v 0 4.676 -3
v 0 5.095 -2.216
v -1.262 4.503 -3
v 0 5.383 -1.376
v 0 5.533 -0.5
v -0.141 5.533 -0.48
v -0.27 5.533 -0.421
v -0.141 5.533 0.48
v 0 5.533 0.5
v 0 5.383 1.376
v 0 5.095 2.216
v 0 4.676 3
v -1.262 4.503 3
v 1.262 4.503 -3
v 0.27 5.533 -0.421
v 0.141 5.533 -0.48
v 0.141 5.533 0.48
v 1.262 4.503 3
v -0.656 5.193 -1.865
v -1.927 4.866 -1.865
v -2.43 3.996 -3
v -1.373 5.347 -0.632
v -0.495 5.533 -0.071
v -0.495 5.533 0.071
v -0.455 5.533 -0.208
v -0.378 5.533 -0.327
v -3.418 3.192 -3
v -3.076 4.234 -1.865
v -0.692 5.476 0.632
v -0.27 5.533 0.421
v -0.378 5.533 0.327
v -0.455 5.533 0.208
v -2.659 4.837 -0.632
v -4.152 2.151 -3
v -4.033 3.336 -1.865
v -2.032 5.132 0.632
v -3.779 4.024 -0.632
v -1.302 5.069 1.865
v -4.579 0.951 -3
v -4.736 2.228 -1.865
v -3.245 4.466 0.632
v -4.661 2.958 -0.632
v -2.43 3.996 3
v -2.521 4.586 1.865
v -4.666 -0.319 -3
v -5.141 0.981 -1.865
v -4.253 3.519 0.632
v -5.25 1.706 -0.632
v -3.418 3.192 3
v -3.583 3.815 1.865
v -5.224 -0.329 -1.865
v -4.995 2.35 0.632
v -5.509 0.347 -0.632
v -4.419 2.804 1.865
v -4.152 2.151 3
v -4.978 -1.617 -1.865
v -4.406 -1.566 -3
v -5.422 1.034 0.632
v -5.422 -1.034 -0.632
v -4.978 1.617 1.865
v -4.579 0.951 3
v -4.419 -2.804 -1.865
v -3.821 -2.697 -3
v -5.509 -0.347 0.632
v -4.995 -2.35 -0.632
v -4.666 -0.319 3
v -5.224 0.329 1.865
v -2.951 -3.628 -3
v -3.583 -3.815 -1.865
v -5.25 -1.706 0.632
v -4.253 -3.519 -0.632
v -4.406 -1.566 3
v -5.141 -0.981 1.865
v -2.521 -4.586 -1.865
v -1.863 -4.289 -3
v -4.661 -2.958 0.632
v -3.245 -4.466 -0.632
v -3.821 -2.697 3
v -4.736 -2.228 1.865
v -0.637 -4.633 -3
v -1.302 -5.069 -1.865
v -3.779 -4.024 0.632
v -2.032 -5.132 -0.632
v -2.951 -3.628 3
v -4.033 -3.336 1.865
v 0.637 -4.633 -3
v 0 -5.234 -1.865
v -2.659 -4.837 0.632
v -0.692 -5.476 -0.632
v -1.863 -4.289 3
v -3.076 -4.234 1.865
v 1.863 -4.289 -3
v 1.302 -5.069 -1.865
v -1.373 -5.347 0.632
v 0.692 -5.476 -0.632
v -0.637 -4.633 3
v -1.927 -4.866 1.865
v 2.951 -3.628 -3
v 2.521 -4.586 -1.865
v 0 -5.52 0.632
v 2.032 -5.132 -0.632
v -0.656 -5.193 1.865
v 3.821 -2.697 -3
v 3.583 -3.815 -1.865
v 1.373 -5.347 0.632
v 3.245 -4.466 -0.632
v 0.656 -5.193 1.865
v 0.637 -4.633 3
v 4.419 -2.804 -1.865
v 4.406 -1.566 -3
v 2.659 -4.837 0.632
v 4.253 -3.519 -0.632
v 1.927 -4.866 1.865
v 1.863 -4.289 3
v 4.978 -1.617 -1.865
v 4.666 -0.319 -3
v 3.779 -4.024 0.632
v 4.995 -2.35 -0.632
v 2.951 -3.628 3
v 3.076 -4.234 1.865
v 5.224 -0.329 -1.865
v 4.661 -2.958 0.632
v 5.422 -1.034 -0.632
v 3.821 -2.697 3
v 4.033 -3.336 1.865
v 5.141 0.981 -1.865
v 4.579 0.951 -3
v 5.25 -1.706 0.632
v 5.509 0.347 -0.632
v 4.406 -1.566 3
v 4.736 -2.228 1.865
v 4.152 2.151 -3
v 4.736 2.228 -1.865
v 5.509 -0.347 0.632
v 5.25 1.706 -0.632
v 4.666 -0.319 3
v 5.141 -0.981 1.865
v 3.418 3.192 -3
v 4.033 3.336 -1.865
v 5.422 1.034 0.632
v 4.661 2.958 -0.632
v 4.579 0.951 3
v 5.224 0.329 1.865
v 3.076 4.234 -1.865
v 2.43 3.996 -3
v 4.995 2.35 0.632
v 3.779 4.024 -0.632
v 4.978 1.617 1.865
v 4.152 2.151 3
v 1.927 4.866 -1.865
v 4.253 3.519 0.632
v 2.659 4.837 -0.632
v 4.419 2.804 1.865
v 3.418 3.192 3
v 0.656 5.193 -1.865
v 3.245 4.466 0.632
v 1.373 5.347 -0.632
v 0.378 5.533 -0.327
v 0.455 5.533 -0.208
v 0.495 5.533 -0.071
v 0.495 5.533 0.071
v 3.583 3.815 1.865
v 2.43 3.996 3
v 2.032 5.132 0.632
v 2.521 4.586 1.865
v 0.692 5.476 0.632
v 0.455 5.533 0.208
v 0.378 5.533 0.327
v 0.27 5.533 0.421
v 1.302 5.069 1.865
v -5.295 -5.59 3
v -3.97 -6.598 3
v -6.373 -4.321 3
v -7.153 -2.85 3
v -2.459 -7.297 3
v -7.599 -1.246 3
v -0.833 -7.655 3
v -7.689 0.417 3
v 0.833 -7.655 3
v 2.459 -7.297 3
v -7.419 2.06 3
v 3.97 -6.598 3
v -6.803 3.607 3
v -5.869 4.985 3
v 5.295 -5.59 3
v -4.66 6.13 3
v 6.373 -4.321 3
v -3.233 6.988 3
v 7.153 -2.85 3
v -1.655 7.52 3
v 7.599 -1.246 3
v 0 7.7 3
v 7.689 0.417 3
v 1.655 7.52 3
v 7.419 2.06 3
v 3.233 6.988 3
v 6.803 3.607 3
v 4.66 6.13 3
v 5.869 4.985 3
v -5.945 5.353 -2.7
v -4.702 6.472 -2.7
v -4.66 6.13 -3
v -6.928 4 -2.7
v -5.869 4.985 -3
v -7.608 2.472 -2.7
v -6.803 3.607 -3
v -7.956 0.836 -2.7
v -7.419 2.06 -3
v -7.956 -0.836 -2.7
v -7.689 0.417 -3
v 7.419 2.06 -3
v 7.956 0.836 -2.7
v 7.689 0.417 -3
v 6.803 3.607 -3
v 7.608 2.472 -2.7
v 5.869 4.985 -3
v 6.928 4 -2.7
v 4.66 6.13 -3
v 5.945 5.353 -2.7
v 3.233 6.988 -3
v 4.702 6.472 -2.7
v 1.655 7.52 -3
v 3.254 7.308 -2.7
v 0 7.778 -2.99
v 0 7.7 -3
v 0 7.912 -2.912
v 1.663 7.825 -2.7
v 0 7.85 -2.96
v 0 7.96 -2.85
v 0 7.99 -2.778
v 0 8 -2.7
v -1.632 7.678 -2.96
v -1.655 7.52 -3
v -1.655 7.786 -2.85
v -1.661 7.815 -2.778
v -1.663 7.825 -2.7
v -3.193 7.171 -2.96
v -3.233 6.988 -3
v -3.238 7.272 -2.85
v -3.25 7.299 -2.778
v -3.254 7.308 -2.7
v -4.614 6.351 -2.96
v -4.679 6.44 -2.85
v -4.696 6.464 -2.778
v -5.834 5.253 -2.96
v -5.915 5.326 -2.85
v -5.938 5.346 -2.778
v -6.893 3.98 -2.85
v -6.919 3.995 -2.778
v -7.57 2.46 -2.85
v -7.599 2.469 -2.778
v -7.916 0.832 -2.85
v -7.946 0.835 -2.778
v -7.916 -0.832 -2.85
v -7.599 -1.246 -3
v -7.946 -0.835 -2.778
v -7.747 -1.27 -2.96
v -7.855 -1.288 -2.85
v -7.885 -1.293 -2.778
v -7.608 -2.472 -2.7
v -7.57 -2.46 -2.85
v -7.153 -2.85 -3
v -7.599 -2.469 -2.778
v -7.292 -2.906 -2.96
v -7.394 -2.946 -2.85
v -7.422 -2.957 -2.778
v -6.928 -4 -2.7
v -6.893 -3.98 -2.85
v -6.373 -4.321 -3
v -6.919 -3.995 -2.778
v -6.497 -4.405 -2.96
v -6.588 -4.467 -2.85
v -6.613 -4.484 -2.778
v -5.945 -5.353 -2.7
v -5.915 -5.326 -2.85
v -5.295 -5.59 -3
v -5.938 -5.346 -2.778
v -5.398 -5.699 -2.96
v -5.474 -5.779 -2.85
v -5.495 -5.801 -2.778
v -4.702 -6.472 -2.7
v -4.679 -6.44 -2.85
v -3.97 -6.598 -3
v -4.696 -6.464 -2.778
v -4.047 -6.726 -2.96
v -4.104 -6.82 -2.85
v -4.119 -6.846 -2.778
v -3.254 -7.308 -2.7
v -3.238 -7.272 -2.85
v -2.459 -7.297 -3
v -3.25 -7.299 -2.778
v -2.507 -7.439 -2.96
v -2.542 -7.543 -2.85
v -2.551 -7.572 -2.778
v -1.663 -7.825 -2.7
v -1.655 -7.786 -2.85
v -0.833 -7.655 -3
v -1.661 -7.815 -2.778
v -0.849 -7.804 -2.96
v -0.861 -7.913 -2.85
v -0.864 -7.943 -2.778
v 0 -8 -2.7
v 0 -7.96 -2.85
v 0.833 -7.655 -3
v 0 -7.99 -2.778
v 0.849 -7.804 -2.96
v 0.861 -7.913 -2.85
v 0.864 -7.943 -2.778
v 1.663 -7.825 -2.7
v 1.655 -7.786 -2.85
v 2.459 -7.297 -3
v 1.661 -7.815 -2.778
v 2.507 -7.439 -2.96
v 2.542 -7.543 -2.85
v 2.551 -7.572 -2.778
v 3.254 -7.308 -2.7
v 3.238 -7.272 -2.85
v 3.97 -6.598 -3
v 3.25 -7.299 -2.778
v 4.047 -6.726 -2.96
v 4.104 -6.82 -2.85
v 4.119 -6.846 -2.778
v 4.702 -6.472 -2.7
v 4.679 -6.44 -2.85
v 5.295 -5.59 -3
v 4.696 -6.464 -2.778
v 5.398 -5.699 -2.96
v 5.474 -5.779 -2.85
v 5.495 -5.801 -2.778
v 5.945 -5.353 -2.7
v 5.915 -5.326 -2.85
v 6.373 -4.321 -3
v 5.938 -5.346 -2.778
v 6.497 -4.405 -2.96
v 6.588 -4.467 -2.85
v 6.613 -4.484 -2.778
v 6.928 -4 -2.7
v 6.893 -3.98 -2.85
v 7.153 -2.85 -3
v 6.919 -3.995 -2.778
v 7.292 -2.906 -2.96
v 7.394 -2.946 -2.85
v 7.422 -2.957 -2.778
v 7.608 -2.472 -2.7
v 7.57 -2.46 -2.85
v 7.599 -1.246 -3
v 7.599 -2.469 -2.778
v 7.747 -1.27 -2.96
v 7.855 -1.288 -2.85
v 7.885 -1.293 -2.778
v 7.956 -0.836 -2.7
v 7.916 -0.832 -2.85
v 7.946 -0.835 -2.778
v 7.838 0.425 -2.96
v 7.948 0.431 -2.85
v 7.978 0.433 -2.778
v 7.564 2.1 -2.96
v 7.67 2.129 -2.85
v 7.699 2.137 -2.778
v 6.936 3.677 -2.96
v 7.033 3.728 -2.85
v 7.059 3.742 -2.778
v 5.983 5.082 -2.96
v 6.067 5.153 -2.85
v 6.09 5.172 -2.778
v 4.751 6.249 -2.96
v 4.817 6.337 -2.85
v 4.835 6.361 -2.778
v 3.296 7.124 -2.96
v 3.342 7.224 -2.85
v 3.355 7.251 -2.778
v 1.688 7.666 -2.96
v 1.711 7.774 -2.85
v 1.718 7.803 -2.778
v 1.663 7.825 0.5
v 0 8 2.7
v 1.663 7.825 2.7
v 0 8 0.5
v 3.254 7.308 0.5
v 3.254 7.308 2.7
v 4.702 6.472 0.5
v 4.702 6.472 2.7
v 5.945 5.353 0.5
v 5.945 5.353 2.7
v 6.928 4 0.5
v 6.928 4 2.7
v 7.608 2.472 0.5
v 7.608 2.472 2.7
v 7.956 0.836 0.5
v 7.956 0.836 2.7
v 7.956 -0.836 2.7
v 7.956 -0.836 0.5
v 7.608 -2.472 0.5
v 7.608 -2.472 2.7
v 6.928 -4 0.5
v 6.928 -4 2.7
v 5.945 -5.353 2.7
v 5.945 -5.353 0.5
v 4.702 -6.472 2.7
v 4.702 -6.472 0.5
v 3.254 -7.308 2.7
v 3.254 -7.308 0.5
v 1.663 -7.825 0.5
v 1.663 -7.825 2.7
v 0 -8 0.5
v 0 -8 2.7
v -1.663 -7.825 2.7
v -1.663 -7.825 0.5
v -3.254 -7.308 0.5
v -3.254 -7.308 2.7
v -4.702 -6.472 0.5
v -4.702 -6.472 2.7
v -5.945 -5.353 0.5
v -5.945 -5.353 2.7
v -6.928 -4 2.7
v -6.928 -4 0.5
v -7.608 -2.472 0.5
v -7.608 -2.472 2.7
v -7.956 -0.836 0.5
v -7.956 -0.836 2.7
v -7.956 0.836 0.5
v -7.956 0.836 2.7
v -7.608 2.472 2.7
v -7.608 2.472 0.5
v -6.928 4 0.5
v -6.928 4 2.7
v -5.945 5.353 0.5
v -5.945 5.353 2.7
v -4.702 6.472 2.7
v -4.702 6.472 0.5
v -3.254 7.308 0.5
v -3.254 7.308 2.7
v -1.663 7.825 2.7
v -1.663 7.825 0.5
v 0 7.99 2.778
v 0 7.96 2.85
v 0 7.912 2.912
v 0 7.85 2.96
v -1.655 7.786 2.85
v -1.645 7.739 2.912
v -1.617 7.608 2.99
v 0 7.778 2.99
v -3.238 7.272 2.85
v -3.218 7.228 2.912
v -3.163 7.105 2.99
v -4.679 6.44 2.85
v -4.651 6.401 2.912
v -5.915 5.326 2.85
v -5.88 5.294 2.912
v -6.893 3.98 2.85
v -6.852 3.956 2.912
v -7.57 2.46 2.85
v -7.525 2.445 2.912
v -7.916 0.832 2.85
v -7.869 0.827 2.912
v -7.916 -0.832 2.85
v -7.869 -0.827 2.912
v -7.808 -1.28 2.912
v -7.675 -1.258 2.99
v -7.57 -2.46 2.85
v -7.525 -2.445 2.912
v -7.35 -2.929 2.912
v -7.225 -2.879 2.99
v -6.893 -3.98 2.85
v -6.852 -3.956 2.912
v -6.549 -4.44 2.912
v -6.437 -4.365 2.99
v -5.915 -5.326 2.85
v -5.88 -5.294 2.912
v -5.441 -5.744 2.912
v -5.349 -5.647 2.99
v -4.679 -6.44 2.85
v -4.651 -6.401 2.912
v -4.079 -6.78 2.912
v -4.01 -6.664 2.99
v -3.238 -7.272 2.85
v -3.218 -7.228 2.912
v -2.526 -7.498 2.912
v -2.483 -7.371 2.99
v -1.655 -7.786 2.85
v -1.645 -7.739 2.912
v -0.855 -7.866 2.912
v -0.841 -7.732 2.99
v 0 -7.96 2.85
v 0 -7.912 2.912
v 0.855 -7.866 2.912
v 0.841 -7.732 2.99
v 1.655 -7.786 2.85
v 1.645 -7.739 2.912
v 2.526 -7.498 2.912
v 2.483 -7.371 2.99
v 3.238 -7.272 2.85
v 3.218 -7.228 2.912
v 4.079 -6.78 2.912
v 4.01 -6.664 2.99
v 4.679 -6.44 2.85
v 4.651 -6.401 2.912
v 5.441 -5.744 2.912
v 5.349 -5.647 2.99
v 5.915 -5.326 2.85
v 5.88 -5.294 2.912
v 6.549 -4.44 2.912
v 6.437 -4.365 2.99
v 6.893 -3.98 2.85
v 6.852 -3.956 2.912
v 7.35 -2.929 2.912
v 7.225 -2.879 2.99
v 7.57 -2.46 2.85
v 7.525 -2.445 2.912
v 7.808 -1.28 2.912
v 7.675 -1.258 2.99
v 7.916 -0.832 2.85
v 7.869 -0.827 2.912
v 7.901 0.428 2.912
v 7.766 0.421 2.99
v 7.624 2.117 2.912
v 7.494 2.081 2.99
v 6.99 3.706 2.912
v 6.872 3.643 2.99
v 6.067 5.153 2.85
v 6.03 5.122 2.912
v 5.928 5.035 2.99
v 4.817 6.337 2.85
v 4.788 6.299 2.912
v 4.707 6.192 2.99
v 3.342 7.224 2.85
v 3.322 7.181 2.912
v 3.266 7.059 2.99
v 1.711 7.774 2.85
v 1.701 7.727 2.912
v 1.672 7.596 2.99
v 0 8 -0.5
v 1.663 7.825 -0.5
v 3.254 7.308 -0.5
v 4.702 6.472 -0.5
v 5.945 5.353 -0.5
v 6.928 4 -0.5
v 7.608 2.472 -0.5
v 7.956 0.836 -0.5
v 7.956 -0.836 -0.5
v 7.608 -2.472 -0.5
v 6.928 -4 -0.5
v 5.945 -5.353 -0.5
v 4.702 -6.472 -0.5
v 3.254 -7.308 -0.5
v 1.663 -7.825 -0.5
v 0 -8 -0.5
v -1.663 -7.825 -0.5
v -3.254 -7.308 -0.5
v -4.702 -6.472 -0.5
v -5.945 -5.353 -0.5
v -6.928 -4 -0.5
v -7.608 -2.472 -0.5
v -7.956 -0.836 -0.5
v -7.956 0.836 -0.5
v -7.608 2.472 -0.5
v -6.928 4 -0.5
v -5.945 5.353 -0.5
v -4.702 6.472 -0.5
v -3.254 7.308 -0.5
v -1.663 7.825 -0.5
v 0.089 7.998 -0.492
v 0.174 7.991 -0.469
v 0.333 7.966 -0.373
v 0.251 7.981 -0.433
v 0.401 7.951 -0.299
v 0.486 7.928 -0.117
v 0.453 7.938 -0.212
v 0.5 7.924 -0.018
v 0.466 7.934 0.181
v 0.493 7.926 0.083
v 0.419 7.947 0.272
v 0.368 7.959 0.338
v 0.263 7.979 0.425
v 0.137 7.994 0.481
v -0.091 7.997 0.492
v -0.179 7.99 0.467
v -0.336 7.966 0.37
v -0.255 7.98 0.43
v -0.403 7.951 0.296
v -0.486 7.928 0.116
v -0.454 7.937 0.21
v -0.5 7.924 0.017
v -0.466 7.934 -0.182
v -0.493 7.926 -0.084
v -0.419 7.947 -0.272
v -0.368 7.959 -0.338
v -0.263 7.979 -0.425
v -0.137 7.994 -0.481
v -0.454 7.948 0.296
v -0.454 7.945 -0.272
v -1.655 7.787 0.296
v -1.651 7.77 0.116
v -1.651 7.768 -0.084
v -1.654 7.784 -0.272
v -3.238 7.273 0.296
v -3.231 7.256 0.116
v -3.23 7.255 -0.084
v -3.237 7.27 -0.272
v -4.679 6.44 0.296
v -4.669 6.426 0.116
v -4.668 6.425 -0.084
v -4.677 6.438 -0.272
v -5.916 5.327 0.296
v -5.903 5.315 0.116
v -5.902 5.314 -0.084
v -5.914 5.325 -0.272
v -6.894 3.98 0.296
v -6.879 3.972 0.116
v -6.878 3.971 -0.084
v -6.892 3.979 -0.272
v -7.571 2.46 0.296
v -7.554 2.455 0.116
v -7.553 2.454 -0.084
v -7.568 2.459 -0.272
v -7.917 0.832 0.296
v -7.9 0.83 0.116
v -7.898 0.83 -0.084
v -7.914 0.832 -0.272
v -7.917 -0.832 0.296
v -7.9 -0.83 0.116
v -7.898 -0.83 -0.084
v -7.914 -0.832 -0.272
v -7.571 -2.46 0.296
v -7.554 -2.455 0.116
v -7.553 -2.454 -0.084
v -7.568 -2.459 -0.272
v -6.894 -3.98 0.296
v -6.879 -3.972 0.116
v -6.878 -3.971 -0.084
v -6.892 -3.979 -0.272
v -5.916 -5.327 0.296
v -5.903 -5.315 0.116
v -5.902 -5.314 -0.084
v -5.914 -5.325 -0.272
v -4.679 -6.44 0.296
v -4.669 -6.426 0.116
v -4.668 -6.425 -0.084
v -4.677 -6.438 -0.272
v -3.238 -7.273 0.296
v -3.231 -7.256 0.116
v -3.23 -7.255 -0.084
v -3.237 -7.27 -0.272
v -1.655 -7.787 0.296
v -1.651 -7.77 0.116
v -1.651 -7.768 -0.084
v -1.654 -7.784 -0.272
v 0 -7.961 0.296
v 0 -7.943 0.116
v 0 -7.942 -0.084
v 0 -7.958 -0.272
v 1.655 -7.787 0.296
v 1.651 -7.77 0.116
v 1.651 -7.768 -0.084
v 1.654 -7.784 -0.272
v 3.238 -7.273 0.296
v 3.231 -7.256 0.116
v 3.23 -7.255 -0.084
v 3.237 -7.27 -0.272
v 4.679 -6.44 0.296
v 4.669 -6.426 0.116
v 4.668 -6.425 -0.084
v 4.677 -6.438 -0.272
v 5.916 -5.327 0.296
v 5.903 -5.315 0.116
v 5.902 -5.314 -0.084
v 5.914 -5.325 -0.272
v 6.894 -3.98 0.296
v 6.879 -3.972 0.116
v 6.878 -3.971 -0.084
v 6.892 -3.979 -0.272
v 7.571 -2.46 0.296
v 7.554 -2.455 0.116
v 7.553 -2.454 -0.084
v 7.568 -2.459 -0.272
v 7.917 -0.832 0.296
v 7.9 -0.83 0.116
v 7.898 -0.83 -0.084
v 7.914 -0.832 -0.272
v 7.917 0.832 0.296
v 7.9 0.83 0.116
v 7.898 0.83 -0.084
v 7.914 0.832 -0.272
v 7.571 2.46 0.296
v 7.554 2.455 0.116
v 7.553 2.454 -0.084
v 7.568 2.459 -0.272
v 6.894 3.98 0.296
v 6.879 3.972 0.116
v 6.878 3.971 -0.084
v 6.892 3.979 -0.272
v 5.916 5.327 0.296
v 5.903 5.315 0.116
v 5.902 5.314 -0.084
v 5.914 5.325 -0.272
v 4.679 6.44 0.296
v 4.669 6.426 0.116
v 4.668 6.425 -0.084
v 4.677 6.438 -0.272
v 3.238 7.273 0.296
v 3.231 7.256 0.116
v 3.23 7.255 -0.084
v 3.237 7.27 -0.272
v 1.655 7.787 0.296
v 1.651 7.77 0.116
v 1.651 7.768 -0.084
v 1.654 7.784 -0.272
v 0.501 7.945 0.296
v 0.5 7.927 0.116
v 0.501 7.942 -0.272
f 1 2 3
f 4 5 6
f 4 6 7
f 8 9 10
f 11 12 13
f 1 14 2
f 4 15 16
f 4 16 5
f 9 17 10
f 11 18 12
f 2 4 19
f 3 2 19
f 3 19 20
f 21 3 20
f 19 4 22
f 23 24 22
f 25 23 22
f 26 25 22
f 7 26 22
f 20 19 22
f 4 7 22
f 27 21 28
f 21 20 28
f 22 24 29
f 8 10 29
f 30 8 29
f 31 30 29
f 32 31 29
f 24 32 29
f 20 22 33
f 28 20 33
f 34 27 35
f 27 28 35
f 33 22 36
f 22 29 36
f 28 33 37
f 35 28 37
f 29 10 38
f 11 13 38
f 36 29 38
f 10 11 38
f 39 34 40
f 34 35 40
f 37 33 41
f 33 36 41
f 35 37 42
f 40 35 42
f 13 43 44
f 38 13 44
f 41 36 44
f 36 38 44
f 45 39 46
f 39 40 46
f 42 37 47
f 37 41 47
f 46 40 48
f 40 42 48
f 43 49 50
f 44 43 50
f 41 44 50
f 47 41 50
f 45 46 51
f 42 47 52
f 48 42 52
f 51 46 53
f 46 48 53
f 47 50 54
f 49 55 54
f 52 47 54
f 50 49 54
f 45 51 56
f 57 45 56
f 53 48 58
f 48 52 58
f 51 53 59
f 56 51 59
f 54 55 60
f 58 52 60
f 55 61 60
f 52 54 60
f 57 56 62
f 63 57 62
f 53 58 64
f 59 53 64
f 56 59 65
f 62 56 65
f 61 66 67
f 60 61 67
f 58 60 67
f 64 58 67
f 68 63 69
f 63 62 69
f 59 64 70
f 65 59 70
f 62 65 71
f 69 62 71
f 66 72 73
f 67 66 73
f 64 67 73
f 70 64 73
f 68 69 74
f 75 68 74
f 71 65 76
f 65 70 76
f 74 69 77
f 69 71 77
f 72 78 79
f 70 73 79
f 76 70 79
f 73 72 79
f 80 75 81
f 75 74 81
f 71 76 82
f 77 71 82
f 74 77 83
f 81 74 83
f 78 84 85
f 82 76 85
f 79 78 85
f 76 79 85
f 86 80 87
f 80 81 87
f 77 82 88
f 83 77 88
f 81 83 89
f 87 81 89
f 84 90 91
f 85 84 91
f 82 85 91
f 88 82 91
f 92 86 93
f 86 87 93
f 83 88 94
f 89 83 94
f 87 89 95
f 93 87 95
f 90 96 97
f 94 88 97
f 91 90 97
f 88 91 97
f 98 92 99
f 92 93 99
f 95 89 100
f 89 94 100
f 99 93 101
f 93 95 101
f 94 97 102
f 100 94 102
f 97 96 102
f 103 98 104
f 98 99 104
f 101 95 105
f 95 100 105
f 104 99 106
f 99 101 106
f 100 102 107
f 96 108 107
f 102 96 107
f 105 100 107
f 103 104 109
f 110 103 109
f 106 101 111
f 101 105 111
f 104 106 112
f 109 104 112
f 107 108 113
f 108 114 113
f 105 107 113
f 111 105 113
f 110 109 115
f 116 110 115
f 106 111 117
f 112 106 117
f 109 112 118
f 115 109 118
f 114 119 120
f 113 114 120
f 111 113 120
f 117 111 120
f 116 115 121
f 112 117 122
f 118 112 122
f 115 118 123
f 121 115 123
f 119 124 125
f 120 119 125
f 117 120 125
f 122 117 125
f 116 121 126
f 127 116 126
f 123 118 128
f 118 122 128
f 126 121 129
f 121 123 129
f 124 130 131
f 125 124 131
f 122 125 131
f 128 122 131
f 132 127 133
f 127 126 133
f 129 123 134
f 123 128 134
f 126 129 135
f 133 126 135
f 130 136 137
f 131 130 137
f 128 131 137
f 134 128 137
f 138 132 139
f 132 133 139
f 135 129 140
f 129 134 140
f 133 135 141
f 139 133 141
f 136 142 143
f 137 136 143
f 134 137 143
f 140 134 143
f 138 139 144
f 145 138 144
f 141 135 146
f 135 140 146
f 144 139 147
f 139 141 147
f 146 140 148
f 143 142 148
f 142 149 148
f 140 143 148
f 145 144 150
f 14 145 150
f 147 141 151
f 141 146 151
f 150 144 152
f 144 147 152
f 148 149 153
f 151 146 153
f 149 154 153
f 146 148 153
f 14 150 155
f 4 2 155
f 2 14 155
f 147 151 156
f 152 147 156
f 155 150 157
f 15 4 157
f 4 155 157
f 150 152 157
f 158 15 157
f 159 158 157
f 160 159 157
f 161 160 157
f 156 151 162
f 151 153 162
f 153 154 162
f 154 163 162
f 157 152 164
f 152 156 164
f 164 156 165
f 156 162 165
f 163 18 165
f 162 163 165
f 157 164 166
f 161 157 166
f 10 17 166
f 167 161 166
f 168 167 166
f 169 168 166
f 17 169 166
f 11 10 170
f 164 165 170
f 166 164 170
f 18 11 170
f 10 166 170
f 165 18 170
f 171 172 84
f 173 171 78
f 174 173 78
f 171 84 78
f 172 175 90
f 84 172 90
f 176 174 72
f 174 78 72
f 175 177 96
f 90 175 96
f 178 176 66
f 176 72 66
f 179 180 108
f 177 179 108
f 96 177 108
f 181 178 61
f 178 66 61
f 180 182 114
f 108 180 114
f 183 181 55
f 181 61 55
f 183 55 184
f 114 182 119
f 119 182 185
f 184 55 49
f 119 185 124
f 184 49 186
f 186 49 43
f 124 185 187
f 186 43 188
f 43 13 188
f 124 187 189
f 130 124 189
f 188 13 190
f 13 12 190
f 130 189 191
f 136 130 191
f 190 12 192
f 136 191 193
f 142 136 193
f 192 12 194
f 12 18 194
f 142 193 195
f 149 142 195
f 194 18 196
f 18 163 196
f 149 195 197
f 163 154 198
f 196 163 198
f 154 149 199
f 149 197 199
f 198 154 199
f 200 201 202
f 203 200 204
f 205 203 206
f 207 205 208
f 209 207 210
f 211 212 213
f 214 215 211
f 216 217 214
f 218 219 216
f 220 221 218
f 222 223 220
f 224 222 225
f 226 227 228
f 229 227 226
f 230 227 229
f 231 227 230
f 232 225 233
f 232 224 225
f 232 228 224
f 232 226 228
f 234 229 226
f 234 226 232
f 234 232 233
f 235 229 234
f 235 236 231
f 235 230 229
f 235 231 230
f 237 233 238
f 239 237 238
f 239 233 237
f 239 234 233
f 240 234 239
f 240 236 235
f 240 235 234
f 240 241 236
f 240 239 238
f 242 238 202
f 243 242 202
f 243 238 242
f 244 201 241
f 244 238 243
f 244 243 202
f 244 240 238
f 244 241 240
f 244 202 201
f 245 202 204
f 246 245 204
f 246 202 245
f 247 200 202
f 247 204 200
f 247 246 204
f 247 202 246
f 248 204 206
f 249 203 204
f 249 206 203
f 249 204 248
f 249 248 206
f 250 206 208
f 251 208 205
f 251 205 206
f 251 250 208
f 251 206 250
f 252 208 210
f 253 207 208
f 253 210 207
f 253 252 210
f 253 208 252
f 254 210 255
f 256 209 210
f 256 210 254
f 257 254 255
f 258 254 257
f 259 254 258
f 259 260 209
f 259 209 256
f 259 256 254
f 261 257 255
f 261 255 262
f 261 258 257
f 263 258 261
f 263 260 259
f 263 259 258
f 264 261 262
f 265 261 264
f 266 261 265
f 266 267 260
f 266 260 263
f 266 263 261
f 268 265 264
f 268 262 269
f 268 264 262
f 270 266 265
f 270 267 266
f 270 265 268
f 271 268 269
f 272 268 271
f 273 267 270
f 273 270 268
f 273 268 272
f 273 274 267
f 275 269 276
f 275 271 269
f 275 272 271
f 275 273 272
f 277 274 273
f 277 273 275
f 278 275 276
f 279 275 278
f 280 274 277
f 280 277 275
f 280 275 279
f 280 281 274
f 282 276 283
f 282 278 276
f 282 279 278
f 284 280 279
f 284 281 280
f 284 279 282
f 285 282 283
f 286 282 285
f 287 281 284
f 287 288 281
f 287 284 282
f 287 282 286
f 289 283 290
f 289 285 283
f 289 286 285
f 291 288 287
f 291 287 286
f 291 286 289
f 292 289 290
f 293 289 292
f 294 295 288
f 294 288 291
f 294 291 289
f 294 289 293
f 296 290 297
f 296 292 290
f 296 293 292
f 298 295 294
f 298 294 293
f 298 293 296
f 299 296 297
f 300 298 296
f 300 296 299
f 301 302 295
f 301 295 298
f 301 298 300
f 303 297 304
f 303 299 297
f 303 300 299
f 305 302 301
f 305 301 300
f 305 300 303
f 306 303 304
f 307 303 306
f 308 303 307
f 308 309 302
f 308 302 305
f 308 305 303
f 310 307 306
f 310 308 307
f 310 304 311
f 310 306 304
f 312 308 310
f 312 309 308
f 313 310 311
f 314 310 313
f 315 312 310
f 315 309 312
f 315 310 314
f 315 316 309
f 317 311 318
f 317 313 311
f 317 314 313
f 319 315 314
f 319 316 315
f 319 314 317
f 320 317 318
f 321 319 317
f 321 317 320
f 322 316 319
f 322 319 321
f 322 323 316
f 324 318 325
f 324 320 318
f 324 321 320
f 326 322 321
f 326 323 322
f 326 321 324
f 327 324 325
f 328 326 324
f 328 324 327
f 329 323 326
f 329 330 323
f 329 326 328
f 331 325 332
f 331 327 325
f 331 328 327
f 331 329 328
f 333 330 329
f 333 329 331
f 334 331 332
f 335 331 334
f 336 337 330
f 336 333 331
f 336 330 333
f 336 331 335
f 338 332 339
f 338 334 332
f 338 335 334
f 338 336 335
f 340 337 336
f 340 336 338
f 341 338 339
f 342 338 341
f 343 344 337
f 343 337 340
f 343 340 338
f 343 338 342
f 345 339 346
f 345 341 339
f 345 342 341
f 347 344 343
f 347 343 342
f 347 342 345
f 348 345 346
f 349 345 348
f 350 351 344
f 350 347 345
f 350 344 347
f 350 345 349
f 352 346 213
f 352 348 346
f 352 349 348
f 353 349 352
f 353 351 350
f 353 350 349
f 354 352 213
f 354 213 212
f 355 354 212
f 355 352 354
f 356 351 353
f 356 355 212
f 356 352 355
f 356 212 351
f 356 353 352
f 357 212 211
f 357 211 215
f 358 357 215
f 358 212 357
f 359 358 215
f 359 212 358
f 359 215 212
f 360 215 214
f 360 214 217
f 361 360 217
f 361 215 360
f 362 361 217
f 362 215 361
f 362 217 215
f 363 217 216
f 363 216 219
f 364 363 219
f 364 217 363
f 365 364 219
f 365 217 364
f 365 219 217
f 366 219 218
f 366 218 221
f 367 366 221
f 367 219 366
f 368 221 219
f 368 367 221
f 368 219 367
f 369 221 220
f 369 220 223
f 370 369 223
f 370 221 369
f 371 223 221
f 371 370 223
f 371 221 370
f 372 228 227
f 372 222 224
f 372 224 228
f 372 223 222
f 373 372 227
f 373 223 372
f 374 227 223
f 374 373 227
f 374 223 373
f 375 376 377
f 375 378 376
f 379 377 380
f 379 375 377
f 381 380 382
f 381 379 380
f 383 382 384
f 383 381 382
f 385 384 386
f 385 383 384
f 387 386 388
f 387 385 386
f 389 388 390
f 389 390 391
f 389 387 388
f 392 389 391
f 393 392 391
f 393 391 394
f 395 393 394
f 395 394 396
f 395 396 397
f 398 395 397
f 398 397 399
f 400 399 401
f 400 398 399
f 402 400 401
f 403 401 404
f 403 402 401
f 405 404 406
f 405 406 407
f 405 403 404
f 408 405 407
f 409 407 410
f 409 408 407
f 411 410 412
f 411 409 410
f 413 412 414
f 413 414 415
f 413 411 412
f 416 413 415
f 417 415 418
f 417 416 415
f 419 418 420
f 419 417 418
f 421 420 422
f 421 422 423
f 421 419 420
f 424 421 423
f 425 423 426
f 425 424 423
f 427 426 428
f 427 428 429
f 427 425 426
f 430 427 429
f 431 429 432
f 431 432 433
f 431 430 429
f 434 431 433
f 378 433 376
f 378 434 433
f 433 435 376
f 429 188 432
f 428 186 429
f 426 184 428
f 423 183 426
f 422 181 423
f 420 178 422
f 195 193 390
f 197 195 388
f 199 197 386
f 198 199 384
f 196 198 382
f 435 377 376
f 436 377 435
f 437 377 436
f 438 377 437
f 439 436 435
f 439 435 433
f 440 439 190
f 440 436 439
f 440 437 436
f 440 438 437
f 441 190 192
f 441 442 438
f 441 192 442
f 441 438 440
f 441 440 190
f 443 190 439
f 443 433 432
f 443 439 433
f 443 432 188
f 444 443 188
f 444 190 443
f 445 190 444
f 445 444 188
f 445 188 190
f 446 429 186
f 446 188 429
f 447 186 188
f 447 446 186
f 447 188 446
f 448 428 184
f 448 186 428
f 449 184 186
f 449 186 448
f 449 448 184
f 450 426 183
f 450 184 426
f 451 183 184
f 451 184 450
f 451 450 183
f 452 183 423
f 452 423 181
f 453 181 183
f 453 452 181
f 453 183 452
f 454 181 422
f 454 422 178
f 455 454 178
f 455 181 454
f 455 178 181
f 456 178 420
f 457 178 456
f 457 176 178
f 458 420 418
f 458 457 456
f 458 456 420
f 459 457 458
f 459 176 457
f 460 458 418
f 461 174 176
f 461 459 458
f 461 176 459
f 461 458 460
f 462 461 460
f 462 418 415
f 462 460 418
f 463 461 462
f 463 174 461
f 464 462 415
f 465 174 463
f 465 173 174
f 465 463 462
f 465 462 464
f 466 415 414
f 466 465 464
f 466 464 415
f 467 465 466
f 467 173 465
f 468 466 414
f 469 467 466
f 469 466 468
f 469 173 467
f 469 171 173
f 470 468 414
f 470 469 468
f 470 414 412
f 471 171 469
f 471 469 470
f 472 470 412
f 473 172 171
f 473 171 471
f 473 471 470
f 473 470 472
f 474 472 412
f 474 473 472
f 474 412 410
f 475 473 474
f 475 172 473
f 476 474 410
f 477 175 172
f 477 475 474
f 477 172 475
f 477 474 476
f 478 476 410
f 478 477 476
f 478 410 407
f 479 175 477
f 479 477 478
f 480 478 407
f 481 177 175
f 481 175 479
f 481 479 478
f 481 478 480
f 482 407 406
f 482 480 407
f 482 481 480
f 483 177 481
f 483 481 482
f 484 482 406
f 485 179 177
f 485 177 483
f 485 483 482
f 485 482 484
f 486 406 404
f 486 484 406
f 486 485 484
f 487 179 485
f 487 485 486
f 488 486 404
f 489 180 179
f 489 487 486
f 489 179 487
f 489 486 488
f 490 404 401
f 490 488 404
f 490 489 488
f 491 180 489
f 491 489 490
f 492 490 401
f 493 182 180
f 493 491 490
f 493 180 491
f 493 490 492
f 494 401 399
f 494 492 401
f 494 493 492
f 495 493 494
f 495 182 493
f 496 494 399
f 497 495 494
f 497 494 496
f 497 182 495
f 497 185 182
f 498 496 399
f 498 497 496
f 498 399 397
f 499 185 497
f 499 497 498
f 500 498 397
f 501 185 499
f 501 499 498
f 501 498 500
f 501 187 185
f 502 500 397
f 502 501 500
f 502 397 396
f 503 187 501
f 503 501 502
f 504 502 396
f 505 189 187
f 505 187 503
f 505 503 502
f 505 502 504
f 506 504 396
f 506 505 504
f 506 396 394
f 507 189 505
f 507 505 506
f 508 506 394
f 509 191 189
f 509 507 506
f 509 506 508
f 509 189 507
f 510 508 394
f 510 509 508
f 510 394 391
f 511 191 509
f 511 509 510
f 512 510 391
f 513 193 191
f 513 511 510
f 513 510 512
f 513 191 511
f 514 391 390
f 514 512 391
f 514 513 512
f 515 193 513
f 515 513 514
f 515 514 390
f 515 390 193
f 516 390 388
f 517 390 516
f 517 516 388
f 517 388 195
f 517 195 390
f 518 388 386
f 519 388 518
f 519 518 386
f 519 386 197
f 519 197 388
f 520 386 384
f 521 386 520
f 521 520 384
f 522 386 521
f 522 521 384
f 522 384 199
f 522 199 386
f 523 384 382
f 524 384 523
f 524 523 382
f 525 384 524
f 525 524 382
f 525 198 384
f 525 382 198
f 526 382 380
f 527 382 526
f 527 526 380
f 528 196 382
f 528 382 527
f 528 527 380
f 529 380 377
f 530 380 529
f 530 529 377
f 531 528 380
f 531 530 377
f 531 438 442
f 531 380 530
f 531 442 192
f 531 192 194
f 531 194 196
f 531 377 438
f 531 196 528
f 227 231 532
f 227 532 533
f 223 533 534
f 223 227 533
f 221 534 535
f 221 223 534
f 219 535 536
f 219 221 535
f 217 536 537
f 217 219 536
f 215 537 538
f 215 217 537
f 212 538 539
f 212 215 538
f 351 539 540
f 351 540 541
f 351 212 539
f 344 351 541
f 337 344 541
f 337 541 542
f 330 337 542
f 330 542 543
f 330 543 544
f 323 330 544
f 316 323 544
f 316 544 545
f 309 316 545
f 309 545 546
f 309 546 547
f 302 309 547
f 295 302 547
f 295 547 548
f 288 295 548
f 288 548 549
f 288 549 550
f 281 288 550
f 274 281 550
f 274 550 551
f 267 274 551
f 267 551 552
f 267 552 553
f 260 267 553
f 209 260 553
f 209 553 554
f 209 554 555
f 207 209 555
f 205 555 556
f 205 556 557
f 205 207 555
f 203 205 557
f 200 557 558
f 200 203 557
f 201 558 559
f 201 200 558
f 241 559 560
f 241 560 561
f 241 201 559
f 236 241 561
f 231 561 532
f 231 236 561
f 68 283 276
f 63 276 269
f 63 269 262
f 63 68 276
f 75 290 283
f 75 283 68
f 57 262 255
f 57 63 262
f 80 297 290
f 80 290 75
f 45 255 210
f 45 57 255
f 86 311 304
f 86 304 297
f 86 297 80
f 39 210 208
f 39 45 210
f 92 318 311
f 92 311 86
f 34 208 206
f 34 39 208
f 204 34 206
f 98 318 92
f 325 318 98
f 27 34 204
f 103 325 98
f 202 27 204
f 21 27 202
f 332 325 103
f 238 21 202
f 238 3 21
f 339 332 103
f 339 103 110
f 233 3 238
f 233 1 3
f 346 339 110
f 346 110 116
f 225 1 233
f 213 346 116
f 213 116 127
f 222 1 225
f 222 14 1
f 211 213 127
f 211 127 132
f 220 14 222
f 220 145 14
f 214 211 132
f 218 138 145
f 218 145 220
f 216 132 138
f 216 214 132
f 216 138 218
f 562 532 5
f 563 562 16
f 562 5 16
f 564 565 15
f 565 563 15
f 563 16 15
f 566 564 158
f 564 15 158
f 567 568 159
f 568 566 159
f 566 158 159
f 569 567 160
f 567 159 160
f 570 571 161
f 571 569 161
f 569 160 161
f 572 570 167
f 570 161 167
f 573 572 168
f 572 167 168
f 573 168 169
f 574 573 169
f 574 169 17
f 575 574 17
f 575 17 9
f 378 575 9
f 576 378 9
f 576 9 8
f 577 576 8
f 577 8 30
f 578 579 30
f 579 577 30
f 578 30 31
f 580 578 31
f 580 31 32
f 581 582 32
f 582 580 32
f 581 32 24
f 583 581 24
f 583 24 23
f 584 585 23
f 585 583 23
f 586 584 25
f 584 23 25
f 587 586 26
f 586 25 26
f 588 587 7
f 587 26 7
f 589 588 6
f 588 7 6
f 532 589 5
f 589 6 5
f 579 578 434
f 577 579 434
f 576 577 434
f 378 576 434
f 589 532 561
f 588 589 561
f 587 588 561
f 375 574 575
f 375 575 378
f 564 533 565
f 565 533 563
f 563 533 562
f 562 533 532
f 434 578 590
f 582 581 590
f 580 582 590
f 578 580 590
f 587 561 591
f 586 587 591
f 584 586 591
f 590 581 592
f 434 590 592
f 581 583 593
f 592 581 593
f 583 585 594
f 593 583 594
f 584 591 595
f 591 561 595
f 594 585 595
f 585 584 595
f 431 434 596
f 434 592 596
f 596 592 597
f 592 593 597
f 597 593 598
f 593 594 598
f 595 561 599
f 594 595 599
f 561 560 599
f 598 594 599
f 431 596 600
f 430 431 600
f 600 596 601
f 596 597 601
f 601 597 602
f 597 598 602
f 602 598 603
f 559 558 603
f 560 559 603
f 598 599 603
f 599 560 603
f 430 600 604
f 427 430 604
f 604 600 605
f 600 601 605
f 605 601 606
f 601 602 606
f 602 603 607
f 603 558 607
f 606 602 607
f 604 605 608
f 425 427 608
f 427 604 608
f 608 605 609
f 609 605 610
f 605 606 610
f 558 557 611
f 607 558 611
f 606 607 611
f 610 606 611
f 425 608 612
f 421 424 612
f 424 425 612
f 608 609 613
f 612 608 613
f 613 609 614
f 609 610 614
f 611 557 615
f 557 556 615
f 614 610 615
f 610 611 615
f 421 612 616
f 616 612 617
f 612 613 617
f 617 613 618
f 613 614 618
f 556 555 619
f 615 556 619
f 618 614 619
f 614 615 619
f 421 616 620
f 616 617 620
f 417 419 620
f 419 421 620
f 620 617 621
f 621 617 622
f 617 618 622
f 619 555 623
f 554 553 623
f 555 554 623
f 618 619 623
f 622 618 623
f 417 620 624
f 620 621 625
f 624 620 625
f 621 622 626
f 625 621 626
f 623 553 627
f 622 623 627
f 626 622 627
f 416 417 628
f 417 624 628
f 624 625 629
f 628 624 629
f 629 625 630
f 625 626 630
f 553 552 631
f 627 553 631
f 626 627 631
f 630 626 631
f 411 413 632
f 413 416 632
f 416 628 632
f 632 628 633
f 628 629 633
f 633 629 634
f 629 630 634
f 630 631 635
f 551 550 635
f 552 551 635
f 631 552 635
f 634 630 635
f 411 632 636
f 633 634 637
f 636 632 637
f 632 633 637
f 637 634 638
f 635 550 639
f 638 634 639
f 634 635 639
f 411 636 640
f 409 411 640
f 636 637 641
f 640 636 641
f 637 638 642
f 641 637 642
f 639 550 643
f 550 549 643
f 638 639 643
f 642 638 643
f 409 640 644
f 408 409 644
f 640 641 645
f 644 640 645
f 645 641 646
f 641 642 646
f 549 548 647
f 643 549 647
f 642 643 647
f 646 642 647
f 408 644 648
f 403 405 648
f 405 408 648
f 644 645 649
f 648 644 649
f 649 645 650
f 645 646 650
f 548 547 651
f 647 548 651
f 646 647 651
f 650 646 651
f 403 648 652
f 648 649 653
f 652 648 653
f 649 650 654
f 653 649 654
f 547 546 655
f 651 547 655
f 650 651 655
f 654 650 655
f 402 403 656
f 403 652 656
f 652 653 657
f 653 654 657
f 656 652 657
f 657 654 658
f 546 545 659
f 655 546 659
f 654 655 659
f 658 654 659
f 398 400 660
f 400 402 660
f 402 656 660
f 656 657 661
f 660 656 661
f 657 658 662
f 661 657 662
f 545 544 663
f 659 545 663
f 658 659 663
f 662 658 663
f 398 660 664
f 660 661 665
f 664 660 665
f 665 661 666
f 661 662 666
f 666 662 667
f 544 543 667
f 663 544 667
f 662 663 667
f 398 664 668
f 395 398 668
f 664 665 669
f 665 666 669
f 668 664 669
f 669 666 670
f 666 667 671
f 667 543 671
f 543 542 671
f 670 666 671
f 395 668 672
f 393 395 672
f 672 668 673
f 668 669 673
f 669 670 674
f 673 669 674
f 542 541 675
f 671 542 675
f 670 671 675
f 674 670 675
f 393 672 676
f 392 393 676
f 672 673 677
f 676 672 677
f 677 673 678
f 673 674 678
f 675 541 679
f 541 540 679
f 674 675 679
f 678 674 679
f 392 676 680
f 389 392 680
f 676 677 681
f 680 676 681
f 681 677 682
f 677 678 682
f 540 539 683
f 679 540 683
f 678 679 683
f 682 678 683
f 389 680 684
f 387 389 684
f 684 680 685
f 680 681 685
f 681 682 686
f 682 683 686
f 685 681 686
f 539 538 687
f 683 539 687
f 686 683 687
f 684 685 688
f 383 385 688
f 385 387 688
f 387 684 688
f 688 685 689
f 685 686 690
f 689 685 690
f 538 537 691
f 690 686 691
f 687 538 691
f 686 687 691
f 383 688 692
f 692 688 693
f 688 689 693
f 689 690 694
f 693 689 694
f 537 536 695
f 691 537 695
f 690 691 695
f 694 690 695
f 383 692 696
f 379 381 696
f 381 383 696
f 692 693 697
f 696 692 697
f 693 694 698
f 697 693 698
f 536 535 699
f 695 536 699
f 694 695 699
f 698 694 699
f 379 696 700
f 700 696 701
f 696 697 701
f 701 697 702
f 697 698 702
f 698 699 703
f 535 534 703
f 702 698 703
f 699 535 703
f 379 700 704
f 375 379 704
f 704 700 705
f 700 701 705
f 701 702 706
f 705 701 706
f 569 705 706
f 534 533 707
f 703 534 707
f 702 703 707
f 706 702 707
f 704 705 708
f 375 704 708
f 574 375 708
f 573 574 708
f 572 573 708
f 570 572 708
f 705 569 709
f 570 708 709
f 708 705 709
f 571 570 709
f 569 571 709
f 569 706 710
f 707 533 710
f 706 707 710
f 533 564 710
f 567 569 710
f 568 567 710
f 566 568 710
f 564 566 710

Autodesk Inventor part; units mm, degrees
sketch "Sketch_3" plane through (0, 0, 0) normal (1, 0, 0) x (0, 1, 0)
  line L0 (0, -4) -> (0, 4)
  line L1 (0, 4) -> (3.8561, 4)
  arc A0 (3.8561, -4) -> (3.8561, 4) centre (0, 0) ccw
  line L2 (3.8561, -4) -> (0, -4)
  line L3 (0, -4) -> (0, 4)
sketch "Sketch_2" plane through (0, 0, 0) normal (1, 0, 0) x (0, 1, 0)
  line L0 (0, -3) -> (0, 3)
  line L1 (0, 3) -> (7.7, 3)
  arc A0 (8, 2.7) -> (7.7, 3) centre (7.7, 2.7) ccw
  line L2 (8, 2.7) -> (8, 0.5)
  arc A1 (8, 0.5) -> (8, -0.5) centre (10.0533, 0) ccw
  line L3 (8, -0.5) -> (8, -2.7)
  arc A2 (7.7, -3) -> (8, -2.7) centre (7.7, -2.7) ccw
  line L4 (7.7, -3) -> (0, -3)
  line L5 (0, -3) -> (0, 3)
revolve "Revolution1" add sketch "Sketch_2" angle 360 about axis through (0, 0, -3) along (0, 0, -1)
revolve "Revolution2" cut sketch "Sketch_3" angle 360 about axis through (0, 0, -4) along (0, 0, -1)
sketch "_____1" plane through (0, 0, 0) normal (1, 0, 0) x (0, 0, -1)
  line L0 (0, -32) -> (0, 32)
  line L1 (0, 9) -> (0.5, 9)
  line L2 (0.5, 9) -> (0.5, 0)
  line L3 (0.5, 0) -> (0, 0)
  line L4 (0, 0) -> (0, 9)
revolve "Revolution3" cut sketch "_____1" angle 360 about axis through (0, -32, 0) along (0, -1, 0)
ref_plane "holder_XY" through (0, 0, 0) normal (0, 0, 1) x (1, 0, 0)
ref_plane "holder_YZ" through (0, 0, 0) normal (1, 0, 0) x (0, 1, 0)
ref_plane "holder_ZX" through (0, 0, 0) normal (0, 1, 0) x (0, 0, 1)
properties part number "RBPB5h"
